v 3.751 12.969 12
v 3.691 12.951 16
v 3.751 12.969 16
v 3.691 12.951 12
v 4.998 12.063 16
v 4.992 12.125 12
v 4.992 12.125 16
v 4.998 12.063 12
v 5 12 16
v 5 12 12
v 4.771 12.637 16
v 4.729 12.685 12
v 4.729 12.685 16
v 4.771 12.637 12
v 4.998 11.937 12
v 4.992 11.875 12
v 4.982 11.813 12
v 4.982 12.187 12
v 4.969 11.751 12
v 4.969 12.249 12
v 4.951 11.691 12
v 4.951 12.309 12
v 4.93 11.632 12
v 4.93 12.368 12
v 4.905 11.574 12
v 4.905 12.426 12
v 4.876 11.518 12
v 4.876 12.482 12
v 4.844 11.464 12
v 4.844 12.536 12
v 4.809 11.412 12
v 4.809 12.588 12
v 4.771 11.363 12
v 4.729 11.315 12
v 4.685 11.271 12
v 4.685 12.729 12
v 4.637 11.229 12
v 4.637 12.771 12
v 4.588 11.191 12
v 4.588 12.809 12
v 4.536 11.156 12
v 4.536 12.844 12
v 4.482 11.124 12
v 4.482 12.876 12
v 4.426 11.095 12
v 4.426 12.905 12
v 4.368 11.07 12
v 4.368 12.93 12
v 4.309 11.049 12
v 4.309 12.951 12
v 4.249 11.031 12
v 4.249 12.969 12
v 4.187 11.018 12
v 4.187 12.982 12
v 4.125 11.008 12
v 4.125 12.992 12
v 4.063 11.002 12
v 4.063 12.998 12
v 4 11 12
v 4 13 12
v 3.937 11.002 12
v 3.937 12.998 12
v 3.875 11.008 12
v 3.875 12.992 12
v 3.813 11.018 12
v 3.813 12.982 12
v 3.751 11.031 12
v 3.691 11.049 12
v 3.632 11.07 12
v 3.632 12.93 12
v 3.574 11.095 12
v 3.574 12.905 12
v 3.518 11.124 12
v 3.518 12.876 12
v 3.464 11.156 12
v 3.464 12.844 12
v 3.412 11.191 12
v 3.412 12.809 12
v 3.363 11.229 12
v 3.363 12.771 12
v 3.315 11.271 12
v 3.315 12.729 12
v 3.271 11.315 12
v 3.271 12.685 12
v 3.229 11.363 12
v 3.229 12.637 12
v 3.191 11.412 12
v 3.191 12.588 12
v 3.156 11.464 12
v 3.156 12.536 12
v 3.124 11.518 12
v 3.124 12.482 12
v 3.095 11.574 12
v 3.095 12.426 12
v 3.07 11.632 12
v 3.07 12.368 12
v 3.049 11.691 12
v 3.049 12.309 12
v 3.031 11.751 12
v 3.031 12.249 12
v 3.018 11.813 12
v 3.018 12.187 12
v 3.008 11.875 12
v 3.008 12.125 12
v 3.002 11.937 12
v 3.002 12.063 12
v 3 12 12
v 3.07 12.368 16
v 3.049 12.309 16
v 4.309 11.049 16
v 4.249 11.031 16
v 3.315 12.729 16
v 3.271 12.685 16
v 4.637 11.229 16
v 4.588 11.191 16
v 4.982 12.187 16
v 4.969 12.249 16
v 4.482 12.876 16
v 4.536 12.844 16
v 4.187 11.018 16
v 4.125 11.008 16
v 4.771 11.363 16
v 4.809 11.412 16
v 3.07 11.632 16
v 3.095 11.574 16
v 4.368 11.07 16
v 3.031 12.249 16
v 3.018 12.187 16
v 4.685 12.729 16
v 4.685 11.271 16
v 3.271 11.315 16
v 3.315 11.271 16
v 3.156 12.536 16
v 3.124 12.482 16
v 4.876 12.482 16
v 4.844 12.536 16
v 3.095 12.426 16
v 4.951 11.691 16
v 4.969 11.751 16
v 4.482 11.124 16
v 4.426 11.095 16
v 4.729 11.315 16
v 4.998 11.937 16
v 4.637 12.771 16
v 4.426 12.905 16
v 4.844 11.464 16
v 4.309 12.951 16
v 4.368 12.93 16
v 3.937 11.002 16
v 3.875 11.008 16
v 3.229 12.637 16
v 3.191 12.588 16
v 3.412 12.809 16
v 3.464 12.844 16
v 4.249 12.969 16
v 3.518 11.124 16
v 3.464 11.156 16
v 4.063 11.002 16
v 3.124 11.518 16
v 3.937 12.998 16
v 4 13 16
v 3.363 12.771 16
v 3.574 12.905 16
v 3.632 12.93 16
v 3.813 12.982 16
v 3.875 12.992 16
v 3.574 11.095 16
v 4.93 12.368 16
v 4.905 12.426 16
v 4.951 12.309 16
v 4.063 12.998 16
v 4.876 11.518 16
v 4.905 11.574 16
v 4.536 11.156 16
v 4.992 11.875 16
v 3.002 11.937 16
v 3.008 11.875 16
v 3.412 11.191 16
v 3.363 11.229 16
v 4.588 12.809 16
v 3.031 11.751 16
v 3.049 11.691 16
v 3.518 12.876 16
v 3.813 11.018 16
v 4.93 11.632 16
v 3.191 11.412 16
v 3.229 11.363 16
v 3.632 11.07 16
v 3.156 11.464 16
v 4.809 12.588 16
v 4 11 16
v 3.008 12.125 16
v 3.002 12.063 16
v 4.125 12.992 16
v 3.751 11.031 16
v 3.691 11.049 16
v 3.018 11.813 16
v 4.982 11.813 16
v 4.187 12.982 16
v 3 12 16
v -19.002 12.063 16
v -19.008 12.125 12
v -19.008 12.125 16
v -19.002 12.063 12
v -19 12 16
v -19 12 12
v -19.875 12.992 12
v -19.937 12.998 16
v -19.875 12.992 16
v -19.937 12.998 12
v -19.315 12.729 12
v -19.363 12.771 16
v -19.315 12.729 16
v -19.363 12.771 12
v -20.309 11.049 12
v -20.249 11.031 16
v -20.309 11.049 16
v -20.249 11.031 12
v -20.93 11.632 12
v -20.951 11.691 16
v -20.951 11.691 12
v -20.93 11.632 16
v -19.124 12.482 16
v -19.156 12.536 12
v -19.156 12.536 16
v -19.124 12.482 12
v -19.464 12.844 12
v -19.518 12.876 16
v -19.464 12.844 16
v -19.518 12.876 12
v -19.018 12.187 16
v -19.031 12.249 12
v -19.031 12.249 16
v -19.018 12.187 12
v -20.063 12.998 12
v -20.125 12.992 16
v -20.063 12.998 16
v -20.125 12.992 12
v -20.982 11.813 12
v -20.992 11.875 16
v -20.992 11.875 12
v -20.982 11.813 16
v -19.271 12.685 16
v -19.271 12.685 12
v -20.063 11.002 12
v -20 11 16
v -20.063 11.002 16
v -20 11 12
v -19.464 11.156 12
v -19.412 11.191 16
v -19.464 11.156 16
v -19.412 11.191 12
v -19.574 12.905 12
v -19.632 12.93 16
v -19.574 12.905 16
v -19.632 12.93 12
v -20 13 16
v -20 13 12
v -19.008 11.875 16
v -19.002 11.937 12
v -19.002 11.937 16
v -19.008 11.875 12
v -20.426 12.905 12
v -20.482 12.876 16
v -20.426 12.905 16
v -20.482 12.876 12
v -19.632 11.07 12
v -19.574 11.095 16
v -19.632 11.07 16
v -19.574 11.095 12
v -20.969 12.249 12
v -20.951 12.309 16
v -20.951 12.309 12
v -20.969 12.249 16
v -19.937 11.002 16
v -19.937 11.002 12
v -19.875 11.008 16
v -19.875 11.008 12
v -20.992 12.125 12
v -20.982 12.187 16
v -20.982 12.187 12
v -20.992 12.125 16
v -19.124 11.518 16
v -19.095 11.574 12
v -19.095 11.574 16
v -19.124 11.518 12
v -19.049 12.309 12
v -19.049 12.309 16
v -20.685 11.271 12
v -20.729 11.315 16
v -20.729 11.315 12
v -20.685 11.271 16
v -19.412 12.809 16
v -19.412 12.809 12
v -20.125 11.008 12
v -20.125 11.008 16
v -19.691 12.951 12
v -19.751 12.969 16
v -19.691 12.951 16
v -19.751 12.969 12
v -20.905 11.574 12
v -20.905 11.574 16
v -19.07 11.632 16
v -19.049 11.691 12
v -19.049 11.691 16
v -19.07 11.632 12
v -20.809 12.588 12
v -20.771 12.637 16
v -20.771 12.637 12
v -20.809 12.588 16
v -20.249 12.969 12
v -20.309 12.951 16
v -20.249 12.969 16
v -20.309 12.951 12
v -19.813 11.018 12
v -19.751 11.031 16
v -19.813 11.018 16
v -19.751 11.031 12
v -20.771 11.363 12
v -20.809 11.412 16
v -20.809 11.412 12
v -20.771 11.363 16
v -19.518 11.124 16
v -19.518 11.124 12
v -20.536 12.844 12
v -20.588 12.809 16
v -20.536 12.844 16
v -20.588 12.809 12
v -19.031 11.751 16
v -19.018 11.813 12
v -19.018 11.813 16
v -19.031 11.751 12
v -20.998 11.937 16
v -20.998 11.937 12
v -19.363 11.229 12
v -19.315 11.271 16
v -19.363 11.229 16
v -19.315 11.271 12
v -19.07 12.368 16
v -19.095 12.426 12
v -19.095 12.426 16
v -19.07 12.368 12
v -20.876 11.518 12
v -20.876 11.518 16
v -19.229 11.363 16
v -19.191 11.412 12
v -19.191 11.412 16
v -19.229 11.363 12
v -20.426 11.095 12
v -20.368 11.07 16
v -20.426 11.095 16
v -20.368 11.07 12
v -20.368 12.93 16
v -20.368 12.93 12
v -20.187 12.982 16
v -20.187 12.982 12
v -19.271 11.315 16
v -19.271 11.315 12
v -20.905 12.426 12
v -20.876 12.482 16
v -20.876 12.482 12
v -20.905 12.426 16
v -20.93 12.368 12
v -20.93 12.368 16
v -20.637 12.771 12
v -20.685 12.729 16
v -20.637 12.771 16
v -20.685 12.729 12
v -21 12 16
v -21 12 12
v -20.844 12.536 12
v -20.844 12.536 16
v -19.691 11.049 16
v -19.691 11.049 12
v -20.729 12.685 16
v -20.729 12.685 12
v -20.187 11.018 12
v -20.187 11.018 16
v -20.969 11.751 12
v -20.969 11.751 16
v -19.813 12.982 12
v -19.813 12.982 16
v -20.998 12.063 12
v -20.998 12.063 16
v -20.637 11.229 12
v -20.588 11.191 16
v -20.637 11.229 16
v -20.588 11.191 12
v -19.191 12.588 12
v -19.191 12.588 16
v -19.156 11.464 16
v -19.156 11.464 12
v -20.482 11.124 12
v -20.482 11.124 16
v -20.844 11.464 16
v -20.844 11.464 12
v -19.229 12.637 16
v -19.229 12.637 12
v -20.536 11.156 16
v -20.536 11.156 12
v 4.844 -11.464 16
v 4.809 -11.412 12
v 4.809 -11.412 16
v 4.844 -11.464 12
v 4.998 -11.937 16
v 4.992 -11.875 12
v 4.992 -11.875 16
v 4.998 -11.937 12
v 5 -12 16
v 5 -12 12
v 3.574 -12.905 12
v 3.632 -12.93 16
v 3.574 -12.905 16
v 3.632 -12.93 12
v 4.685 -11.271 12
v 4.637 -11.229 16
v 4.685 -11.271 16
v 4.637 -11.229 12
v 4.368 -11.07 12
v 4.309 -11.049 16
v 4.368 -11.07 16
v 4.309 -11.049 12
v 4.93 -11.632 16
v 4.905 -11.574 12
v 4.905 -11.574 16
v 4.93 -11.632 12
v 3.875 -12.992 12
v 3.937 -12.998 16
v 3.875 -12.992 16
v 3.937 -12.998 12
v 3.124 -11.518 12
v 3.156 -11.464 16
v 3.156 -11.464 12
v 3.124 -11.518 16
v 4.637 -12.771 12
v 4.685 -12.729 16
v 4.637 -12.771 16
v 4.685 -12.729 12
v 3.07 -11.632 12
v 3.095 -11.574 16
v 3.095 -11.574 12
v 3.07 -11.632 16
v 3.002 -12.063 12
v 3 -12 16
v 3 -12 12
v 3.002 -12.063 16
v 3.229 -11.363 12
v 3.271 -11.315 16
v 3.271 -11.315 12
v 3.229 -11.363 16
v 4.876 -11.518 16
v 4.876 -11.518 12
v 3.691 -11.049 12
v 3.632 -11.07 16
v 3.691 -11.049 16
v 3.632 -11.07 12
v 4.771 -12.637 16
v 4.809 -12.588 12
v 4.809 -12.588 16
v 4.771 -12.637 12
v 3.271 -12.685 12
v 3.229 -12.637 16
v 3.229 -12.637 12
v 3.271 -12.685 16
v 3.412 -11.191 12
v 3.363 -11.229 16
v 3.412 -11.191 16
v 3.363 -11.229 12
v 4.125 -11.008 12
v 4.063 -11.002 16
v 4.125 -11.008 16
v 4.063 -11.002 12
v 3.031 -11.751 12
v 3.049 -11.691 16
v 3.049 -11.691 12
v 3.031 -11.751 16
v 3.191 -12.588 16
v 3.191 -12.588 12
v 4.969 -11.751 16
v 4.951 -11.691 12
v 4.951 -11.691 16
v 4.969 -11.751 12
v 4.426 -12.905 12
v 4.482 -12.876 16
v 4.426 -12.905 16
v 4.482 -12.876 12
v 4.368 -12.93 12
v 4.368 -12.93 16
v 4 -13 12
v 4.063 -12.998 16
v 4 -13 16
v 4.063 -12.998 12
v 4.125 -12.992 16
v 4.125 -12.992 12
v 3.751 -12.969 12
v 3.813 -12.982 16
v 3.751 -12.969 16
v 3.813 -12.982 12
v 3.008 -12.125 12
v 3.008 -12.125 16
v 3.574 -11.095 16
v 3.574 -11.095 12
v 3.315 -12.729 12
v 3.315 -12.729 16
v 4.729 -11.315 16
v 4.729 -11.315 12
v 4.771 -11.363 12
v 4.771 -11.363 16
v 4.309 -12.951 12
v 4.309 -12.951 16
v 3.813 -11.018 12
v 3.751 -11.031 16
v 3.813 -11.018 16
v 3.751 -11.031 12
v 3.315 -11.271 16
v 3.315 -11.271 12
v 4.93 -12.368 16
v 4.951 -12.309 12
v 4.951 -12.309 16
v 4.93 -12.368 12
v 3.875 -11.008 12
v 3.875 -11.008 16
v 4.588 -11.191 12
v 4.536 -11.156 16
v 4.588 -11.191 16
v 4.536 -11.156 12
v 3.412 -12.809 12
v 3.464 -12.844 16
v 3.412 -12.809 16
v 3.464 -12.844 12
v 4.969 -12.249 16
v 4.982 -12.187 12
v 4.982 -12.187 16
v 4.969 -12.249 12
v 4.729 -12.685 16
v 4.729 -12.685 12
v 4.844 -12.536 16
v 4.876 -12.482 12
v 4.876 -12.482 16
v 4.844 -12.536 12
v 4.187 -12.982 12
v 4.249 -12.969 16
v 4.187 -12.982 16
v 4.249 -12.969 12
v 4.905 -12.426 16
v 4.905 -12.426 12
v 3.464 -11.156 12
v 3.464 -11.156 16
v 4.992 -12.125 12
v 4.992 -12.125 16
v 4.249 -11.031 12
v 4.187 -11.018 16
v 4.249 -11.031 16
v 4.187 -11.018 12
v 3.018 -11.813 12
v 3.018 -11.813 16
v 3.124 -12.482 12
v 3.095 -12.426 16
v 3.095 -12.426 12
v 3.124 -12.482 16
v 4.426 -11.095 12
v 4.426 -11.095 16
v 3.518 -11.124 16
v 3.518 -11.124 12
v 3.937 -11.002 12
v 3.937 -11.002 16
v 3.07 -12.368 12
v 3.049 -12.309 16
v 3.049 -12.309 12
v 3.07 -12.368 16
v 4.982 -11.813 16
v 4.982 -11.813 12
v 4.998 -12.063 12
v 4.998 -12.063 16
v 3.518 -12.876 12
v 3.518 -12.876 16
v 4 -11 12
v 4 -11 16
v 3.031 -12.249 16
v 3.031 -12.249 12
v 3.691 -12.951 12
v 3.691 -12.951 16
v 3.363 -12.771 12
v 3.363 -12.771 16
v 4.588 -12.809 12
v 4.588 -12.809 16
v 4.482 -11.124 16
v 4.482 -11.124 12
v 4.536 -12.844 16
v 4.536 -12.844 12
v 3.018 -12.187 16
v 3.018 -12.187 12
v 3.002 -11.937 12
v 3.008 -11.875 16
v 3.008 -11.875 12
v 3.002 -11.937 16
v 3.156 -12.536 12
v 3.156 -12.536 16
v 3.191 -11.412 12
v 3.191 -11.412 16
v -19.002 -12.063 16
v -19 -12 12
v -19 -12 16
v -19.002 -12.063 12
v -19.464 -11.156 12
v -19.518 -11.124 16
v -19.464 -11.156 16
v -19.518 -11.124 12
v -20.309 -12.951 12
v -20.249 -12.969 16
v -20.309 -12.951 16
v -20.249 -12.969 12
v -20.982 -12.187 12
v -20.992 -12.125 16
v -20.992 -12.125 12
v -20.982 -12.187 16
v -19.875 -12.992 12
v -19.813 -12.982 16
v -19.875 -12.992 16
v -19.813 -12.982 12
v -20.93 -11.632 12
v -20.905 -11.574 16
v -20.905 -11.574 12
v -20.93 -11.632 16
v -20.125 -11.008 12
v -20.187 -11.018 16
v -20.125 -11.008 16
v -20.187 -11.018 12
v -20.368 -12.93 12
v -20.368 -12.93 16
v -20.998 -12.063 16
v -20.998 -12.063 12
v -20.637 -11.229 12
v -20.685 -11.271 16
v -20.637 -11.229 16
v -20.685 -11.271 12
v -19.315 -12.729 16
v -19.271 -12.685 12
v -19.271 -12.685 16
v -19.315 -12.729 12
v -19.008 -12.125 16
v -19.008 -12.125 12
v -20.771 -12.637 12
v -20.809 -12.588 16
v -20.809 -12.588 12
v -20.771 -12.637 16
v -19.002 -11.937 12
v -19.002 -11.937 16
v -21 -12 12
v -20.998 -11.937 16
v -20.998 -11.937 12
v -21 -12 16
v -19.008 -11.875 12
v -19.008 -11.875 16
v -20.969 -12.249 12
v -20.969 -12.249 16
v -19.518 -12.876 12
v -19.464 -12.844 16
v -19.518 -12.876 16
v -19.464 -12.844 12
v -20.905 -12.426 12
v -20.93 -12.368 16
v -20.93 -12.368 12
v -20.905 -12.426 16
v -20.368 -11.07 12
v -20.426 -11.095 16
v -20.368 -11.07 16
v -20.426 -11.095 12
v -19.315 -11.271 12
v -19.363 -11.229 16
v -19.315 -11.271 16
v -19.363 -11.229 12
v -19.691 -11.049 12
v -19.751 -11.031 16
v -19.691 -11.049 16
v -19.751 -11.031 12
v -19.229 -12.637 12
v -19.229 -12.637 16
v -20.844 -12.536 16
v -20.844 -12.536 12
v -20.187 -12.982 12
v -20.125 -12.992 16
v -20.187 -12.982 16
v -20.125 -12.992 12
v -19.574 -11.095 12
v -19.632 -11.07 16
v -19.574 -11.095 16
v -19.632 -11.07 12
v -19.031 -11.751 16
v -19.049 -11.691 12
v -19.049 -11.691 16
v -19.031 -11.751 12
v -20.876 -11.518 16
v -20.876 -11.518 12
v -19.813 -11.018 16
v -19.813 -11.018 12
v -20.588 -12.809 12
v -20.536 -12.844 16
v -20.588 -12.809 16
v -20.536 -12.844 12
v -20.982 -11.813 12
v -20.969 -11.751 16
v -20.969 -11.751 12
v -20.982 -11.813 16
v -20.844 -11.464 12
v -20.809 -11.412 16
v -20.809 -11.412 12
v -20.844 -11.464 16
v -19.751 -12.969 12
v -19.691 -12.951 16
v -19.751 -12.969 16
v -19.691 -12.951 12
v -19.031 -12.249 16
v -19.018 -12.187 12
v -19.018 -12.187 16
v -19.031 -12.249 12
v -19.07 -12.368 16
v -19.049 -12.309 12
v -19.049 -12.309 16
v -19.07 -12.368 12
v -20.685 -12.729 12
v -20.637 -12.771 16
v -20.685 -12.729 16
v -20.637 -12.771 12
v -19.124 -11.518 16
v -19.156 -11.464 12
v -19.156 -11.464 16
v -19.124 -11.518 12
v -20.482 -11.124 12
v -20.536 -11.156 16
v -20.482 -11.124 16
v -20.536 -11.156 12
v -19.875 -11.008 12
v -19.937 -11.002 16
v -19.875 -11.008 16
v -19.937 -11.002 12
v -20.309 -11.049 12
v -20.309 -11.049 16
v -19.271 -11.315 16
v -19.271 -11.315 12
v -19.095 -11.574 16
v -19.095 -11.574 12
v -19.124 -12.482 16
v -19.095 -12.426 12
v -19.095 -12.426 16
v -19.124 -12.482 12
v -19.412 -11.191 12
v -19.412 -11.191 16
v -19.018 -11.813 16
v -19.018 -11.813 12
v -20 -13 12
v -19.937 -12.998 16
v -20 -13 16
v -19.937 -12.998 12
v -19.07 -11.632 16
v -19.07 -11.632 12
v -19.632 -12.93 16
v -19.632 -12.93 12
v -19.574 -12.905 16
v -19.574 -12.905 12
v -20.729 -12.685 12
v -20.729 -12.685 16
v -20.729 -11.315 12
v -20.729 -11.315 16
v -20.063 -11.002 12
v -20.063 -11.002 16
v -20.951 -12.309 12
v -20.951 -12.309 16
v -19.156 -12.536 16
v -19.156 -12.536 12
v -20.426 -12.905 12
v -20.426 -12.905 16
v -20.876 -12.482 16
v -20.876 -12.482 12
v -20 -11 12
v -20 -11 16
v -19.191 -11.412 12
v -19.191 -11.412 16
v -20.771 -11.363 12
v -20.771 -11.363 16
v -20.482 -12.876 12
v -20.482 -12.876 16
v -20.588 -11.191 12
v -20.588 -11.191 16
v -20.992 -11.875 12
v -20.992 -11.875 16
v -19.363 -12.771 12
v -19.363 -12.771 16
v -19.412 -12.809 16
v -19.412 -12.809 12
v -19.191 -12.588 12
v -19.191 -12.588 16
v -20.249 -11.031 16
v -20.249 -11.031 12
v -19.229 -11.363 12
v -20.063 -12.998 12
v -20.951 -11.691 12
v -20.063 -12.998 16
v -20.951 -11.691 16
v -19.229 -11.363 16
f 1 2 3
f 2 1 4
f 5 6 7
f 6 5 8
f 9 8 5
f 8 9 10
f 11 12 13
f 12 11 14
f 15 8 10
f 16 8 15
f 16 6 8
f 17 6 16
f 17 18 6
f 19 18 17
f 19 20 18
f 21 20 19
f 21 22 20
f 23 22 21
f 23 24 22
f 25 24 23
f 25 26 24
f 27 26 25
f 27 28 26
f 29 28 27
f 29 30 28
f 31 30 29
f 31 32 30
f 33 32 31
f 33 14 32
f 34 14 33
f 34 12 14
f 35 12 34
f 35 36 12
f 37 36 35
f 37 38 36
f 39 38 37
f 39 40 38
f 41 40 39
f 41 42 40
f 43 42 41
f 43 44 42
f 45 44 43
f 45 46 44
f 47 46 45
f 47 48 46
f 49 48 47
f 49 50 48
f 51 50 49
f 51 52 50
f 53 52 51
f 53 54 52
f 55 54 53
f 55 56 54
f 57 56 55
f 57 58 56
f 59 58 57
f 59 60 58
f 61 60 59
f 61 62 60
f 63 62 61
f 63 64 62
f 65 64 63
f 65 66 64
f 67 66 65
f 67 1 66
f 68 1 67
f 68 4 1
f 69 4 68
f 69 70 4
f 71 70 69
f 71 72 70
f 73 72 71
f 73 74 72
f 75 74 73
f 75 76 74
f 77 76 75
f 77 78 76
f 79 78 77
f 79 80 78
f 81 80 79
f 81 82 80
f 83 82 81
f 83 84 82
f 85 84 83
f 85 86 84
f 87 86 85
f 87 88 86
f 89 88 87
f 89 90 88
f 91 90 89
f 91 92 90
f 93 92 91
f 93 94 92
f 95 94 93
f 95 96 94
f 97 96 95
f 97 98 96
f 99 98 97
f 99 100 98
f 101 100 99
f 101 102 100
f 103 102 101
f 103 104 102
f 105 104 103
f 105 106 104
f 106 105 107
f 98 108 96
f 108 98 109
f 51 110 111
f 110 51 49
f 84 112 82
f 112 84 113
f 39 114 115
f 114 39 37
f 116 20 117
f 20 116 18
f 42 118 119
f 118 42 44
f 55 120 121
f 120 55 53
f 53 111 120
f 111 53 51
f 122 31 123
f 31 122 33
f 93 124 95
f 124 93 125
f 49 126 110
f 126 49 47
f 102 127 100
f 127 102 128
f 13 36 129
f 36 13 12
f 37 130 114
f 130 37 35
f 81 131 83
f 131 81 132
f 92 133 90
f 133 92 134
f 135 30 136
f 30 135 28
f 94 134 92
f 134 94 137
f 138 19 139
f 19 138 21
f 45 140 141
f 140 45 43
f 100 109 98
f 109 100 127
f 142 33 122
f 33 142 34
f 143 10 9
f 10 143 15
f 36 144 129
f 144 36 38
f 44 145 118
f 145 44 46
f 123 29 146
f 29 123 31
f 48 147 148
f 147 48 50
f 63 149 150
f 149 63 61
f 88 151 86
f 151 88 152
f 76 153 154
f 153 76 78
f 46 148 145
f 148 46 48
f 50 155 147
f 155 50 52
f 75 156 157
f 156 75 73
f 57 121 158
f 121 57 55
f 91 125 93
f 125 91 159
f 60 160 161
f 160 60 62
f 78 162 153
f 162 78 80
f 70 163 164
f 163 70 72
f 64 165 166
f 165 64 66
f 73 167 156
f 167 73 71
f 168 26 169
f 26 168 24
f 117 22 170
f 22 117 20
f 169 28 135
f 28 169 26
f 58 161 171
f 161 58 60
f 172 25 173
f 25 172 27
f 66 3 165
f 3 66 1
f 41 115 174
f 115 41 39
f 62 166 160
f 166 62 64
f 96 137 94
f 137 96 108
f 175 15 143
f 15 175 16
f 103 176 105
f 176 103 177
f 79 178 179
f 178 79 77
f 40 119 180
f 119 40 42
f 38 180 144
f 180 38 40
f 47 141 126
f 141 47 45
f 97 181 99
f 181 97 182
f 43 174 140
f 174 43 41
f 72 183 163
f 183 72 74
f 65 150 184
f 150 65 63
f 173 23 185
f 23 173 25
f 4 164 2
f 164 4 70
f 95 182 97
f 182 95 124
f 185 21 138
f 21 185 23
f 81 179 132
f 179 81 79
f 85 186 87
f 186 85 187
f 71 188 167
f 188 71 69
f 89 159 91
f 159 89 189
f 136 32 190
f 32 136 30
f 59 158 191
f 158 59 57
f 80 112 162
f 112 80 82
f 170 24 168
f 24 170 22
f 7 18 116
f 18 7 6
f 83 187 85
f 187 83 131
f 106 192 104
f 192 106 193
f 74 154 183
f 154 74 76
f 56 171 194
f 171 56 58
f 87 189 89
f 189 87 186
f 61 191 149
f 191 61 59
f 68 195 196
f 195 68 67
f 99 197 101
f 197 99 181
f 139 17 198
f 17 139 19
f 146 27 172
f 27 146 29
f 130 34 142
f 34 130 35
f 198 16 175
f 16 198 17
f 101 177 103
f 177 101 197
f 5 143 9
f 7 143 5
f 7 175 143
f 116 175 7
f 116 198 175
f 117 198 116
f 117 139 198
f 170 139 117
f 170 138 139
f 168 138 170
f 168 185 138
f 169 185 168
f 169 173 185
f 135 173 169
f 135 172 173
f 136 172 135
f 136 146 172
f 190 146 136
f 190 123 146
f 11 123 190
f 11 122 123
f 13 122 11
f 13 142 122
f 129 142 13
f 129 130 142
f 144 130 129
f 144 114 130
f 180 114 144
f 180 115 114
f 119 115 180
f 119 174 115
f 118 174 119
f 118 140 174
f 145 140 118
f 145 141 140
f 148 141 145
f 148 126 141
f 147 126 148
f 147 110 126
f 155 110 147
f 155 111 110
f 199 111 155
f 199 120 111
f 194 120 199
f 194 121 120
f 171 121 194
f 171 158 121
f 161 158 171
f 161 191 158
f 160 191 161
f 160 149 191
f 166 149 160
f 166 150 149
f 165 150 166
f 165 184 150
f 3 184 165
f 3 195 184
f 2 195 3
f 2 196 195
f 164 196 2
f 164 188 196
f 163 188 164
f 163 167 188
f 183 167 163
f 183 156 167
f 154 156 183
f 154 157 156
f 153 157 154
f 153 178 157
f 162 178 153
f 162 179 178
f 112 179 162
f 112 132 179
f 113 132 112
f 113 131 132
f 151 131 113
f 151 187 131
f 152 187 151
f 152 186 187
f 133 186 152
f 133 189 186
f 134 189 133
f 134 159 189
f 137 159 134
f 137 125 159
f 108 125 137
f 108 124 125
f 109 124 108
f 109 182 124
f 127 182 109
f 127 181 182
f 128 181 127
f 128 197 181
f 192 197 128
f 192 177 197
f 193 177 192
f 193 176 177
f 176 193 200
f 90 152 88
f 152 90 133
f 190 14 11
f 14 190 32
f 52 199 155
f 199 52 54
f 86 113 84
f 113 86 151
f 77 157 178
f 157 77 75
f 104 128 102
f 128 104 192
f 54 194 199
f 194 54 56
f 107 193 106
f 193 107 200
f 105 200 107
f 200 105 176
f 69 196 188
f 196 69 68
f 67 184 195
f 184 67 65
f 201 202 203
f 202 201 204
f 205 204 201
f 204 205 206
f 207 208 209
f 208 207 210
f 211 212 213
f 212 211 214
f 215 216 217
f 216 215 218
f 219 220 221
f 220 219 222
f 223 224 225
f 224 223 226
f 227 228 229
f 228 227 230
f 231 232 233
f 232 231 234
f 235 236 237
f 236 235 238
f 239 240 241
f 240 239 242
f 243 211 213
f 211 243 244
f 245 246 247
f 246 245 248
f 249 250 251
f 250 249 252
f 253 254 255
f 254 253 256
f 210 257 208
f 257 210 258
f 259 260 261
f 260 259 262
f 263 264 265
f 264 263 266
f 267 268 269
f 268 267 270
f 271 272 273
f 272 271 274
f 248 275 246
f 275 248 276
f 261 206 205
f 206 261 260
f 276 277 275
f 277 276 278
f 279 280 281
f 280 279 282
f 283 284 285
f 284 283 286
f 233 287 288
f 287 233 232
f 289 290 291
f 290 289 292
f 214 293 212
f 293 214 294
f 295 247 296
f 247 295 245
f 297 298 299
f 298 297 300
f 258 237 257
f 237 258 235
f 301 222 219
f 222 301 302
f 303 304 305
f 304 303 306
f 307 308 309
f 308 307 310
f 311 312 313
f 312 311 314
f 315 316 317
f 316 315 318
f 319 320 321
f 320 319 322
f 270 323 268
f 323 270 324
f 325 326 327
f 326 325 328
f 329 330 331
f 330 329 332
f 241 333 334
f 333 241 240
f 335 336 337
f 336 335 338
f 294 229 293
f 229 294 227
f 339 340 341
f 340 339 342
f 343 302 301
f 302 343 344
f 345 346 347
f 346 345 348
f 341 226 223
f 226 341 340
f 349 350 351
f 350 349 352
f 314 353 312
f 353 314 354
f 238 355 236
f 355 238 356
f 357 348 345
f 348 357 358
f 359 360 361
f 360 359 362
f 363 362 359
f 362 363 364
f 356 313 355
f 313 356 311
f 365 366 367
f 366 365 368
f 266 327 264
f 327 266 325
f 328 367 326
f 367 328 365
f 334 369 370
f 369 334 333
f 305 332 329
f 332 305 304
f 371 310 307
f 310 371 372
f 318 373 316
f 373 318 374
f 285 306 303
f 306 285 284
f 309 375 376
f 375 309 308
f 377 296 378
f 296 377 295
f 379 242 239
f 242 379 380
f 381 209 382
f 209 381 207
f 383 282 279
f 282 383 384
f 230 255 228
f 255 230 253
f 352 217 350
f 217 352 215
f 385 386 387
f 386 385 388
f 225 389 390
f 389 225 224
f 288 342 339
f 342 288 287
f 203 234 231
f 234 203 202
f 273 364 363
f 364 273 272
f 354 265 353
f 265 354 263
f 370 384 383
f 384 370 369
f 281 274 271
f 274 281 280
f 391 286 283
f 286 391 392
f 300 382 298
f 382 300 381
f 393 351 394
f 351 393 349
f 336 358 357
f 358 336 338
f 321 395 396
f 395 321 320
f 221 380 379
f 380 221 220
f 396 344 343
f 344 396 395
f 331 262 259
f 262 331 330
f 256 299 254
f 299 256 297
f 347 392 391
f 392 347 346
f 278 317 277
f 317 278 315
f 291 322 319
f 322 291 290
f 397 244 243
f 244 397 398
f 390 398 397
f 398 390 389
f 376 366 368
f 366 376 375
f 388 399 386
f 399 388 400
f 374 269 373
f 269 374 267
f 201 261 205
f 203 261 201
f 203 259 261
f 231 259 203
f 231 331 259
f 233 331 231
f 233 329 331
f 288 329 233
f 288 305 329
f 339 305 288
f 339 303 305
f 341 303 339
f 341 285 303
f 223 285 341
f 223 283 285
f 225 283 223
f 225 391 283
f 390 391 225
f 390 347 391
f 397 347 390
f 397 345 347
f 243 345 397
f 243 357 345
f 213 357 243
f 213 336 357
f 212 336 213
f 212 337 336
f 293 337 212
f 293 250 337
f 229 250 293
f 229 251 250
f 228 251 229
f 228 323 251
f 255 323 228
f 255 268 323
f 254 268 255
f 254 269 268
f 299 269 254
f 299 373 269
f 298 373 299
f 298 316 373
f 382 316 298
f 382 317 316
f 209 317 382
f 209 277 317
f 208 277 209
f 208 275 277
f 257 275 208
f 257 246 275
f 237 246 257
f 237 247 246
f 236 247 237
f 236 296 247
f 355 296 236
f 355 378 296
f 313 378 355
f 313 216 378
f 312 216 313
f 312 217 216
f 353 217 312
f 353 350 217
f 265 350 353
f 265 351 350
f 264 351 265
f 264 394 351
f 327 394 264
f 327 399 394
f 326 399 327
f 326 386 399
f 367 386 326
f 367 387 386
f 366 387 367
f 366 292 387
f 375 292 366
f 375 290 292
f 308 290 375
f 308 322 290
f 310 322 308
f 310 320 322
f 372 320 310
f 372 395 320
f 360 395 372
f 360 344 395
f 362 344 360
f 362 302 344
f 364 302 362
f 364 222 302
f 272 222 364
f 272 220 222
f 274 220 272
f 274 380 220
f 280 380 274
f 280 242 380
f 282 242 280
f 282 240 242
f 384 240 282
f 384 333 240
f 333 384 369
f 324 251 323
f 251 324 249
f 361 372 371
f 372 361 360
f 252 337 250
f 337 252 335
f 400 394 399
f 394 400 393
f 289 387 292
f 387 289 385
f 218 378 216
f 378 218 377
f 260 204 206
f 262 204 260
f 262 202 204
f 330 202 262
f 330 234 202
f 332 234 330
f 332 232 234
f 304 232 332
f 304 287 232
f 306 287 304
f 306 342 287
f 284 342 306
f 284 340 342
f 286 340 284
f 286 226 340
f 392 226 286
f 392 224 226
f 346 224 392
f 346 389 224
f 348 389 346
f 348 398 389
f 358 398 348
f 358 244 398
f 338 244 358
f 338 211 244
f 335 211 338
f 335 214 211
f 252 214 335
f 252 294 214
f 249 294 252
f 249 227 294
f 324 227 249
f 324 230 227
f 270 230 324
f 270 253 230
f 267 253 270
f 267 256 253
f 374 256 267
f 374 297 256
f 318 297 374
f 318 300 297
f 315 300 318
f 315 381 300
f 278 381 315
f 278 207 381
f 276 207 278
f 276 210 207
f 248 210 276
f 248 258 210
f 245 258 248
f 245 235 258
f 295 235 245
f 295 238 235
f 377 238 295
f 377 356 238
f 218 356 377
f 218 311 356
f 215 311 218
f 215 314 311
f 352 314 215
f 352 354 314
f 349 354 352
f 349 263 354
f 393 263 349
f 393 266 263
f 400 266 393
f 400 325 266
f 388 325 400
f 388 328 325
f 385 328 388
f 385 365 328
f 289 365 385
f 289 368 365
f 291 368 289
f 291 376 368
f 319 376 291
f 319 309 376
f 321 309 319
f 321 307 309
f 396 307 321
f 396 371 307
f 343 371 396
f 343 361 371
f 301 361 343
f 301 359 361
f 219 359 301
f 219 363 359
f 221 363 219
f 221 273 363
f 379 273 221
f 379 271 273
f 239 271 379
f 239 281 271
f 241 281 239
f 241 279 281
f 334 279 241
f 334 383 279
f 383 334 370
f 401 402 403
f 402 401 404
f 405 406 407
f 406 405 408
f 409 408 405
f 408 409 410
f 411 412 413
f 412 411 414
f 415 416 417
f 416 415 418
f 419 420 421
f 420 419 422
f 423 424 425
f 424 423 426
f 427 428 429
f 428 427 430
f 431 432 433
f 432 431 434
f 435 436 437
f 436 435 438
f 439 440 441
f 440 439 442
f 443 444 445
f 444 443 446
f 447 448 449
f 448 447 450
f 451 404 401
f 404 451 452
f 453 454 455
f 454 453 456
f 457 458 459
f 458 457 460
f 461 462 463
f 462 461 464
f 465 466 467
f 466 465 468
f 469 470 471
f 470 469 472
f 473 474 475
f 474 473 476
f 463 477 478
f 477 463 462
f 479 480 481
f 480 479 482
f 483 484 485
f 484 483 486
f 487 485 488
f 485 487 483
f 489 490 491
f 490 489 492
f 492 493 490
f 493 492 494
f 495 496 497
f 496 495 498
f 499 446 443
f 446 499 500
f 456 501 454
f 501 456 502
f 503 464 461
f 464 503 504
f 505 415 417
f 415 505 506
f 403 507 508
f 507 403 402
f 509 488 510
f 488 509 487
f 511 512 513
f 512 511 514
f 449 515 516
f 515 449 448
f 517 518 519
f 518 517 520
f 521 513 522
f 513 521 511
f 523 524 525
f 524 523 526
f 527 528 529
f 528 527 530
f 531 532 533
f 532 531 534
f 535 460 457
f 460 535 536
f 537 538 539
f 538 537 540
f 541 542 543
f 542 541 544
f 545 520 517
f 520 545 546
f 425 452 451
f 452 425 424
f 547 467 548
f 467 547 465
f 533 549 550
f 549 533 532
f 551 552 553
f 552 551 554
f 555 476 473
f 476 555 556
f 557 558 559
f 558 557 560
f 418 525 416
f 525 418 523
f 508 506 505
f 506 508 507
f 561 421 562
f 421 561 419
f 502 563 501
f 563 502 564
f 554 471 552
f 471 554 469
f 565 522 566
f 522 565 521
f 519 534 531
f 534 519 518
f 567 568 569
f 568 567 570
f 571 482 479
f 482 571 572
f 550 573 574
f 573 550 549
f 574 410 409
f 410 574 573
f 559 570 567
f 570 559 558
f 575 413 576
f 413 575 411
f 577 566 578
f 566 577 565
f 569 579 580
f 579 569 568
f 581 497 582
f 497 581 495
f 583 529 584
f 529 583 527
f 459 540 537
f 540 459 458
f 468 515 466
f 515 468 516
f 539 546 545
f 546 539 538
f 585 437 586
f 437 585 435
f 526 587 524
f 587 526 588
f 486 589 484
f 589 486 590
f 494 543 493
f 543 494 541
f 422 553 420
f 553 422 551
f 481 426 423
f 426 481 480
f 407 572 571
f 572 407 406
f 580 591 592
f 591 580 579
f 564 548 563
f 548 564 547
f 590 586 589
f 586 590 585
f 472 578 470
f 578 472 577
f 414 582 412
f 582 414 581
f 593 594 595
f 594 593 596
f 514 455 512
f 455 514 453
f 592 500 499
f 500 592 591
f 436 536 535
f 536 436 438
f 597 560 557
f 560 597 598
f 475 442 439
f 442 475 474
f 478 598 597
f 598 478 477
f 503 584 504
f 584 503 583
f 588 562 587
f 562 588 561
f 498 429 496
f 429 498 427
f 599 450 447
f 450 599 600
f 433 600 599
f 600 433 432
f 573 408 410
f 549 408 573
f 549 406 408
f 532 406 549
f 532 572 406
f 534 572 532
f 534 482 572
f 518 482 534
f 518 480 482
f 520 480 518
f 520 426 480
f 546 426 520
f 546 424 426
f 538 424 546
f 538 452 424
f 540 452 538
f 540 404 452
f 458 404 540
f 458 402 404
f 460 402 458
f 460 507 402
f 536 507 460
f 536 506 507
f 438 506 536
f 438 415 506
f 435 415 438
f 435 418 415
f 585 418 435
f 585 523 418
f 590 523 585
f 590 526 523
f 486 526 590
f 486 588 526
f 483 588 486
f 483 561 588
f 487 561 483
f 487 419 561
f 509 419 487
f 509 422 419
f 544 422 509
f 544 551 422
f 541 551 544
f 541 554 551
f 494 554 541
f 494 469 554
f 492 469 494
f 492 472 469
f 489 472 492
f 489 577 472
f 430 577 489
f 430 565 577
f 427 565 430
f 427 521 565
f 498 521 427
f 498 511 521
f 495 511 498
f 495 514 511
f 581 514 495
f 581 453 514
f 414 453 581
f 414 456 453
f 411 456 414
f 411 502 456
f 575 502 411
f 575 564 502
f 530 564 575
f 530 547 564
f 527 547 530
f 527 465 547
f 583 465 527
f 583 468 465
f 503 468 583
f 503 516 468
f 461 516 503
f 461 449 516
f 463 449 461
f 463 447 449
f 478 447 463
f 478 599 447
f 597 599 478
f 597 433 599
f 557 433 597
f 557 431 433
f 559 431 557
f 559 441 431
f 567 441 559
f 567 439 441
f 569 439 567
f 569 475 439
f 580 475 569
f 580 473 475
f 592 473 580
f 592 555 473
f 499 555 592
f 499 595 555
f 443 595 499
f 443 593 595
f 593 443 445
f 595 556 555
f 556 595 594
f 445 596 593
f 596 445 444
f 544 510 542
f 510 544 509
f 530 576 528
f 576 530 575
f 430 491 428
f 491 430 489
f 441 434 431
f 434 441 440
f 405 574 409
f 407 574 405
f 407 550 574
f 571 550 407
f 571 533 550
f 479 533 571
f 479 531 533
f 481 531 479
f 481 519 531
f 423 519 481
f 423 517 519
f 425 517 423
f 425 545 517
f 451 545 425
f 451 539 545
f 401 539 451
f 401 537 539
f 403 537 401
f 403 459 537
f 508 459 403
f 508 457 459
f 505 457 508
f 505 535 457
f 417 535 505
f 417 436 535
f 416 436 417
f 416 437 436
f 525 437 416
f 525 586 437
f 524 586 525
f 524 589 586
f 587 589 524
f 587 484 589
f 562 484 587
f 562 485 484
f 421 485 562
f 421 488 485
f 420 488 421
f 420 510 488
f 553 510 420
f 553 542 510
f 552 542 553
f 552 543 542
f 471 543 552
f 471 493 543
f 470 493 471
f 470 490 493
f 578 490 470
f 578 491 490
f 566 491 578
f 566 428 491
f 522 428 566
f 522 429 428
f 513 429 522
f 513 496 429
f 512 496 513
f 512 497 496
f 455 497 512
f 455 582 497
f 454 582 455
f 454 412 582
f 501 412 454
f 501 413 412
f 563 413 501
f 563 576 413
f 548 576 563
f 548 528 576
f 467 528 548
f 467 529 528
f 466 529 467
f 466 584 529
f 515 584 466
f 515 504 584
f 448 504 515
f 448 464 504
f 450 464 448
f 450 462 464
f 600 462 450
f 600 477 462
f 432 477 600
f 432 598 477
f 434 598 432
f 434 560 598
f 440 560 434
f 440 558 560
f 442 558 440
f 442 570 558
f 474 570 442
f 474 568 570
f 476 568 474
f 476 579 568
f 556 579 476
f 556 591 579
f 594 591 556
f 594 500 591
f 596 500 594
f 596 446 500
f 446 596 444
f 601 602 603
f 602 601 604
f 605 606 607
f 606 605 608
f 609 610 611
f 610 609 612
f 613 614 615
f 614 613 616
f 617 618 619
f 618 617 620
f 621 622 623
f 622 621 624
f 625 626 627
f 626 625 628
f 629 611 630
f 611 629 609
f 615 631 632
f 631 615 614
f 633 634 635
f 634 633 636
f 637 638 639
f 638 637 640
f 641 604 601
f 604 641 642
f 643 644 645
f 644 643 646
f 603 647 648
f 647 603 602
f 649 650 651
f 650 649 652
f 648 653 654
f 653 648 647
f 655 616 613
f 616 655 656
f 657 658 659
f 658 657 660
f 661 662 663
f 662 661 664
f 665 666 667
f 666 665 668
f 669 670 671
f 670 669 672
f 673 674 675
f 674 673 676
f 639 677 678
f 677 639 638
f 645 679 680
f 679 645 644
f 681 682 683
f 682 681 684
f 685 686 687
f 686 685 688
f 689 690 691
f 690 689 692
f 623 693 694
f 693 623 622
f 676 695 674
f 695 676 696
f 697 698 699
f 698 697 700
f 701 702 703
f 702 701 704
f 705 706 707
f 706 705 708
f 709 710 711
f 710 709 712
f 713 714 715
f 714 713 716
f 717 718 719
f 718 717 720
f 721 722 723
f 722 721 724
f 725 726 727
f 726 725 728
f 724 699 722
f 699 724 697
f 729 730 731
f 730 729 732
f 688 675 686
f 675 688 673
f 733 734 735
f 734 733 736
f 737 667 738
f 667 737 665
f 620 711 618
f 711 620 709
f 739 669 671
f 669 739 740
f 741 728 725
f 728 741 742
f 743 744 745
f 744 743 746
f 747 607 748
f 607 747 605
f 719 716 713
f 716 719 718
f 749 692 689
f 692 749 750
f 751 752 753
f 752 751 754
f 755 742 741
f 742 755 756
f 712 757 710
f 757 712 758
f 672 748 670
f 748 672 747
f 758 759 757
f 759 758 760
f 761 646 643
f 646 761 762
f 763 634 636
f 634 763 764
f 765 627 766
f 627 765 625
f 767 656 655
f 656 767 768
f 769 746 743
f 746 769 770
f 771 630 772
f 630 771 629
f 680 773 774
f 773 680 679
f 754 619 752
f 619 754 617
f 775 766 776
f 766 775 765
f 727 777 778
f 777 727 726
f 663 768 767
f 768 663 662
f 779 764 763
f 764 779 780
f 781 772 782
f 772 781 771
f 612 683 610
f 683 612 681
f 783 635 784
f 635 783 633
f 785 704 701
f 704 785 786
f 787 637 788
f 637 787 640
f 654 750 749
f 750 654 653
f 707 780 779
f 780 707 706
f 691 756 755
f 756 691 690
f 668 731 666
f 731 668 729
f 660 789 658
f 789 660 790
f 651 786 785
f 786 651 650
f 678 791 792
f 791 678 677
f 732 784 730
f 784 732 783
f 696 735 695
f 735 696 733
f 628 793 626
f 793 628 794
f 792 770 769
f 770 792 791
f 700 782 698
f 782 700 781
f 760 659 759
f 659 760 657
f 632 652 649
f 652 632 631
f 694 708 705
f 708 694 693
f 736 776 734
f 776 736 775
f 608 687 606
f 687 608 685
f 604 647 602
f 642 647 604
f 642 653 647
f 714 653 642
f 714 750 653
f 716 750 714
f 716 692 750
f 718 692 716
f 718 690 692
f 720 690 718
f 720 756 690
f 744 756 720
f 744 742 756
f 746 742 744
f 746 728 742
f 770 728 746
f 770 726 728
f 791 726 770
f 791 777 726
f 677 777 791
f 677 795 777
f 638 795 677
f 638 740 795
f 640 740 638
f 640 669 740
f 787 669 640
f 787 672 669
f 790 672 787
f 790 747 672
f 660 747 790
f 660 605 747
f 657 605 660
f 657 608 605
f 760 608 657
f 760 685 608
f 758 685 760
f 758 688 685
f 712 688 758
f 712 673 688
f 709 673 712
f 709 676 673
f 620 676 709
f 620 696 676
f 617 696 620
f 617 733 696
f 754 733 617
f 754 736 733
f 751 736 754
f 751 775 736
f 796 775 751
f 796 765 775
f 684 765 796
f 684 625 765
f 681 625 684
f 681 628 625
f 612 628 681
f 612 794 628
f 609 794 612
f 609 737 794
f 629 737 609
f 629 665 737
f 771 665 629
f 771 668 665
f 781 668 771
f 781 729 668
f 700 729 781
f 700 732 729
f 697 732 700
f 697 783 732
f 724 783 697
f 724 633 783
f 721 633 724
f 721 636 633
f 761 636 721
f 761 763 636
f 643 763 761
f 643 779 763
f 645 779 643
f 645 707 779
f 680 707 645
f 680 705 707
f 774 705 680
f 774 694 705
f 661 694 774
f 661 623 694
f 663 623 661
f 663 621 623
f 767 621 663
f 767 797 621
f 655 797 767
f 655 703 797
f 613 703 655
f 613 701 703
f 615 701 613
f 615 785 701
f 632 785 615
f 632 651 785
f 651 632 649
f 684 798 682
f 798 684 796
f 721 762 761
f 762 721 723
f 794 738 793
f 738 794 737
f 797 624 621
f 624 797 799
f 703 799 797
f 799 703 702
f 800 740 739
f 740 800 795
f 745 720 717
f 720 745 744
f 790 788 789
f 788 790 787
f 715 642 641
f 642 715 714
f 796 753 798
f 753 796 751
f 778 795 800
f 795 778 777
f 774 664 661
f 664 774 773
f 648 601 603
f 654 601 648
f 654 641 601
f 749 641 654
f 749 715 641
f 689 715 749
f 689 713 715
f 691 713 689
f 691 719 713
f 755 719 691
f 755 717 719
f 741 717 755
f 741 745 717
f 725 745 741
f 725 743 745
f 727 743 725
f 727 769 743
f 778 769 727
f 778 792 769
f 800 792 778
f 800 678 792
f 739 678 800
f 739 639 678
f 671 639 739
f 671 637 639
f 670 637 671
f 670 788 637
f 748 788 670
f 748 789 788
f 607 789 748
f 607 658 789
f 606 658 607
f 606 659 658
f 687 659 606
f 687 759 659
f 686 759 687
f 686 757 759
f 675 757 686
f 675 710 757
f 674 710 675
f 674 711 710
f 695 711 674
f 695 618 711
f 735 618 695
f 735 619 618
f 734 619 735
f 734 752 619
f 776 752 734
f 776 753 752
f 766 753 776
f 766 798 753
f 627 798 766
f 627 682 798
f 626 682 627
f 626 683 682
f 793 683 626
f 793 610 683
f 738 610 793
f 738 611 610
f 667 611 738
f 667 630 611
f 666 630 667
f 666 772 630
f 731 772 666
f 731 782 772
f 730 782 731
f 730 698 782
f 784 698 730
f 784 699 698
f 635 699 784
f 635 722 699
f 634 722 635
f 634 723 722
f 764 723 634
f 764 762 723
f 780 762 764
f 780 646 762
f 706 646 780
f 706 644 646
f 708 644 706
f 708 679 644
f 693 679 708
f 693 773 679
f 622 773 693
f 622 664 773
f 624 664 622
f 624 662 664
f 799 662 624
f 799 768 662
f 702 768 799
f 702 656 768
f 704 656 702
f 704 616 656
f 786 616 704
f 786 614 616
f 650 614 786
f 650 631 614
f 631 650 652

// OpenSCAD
$fn = 100;

difference() {
    rotate_extrude()
        import(file = "boitier-joystick-haut-moitie.dxf",layer = "0");

    translate([-8, 0, 20])
        cube(size=19, center=true);
};

module picot() {
   cylinder(h = 4, r=1, center = true);
}

module picots() {
    translate([12 , 12,  0]) picot();
    translate([-12 , 12,  0]) picot();
    translate([12 , -12,  0]) picot();
    translate([-12 , -12,  0]) picot();
}

translate([-8, 0, 14]) picots();
